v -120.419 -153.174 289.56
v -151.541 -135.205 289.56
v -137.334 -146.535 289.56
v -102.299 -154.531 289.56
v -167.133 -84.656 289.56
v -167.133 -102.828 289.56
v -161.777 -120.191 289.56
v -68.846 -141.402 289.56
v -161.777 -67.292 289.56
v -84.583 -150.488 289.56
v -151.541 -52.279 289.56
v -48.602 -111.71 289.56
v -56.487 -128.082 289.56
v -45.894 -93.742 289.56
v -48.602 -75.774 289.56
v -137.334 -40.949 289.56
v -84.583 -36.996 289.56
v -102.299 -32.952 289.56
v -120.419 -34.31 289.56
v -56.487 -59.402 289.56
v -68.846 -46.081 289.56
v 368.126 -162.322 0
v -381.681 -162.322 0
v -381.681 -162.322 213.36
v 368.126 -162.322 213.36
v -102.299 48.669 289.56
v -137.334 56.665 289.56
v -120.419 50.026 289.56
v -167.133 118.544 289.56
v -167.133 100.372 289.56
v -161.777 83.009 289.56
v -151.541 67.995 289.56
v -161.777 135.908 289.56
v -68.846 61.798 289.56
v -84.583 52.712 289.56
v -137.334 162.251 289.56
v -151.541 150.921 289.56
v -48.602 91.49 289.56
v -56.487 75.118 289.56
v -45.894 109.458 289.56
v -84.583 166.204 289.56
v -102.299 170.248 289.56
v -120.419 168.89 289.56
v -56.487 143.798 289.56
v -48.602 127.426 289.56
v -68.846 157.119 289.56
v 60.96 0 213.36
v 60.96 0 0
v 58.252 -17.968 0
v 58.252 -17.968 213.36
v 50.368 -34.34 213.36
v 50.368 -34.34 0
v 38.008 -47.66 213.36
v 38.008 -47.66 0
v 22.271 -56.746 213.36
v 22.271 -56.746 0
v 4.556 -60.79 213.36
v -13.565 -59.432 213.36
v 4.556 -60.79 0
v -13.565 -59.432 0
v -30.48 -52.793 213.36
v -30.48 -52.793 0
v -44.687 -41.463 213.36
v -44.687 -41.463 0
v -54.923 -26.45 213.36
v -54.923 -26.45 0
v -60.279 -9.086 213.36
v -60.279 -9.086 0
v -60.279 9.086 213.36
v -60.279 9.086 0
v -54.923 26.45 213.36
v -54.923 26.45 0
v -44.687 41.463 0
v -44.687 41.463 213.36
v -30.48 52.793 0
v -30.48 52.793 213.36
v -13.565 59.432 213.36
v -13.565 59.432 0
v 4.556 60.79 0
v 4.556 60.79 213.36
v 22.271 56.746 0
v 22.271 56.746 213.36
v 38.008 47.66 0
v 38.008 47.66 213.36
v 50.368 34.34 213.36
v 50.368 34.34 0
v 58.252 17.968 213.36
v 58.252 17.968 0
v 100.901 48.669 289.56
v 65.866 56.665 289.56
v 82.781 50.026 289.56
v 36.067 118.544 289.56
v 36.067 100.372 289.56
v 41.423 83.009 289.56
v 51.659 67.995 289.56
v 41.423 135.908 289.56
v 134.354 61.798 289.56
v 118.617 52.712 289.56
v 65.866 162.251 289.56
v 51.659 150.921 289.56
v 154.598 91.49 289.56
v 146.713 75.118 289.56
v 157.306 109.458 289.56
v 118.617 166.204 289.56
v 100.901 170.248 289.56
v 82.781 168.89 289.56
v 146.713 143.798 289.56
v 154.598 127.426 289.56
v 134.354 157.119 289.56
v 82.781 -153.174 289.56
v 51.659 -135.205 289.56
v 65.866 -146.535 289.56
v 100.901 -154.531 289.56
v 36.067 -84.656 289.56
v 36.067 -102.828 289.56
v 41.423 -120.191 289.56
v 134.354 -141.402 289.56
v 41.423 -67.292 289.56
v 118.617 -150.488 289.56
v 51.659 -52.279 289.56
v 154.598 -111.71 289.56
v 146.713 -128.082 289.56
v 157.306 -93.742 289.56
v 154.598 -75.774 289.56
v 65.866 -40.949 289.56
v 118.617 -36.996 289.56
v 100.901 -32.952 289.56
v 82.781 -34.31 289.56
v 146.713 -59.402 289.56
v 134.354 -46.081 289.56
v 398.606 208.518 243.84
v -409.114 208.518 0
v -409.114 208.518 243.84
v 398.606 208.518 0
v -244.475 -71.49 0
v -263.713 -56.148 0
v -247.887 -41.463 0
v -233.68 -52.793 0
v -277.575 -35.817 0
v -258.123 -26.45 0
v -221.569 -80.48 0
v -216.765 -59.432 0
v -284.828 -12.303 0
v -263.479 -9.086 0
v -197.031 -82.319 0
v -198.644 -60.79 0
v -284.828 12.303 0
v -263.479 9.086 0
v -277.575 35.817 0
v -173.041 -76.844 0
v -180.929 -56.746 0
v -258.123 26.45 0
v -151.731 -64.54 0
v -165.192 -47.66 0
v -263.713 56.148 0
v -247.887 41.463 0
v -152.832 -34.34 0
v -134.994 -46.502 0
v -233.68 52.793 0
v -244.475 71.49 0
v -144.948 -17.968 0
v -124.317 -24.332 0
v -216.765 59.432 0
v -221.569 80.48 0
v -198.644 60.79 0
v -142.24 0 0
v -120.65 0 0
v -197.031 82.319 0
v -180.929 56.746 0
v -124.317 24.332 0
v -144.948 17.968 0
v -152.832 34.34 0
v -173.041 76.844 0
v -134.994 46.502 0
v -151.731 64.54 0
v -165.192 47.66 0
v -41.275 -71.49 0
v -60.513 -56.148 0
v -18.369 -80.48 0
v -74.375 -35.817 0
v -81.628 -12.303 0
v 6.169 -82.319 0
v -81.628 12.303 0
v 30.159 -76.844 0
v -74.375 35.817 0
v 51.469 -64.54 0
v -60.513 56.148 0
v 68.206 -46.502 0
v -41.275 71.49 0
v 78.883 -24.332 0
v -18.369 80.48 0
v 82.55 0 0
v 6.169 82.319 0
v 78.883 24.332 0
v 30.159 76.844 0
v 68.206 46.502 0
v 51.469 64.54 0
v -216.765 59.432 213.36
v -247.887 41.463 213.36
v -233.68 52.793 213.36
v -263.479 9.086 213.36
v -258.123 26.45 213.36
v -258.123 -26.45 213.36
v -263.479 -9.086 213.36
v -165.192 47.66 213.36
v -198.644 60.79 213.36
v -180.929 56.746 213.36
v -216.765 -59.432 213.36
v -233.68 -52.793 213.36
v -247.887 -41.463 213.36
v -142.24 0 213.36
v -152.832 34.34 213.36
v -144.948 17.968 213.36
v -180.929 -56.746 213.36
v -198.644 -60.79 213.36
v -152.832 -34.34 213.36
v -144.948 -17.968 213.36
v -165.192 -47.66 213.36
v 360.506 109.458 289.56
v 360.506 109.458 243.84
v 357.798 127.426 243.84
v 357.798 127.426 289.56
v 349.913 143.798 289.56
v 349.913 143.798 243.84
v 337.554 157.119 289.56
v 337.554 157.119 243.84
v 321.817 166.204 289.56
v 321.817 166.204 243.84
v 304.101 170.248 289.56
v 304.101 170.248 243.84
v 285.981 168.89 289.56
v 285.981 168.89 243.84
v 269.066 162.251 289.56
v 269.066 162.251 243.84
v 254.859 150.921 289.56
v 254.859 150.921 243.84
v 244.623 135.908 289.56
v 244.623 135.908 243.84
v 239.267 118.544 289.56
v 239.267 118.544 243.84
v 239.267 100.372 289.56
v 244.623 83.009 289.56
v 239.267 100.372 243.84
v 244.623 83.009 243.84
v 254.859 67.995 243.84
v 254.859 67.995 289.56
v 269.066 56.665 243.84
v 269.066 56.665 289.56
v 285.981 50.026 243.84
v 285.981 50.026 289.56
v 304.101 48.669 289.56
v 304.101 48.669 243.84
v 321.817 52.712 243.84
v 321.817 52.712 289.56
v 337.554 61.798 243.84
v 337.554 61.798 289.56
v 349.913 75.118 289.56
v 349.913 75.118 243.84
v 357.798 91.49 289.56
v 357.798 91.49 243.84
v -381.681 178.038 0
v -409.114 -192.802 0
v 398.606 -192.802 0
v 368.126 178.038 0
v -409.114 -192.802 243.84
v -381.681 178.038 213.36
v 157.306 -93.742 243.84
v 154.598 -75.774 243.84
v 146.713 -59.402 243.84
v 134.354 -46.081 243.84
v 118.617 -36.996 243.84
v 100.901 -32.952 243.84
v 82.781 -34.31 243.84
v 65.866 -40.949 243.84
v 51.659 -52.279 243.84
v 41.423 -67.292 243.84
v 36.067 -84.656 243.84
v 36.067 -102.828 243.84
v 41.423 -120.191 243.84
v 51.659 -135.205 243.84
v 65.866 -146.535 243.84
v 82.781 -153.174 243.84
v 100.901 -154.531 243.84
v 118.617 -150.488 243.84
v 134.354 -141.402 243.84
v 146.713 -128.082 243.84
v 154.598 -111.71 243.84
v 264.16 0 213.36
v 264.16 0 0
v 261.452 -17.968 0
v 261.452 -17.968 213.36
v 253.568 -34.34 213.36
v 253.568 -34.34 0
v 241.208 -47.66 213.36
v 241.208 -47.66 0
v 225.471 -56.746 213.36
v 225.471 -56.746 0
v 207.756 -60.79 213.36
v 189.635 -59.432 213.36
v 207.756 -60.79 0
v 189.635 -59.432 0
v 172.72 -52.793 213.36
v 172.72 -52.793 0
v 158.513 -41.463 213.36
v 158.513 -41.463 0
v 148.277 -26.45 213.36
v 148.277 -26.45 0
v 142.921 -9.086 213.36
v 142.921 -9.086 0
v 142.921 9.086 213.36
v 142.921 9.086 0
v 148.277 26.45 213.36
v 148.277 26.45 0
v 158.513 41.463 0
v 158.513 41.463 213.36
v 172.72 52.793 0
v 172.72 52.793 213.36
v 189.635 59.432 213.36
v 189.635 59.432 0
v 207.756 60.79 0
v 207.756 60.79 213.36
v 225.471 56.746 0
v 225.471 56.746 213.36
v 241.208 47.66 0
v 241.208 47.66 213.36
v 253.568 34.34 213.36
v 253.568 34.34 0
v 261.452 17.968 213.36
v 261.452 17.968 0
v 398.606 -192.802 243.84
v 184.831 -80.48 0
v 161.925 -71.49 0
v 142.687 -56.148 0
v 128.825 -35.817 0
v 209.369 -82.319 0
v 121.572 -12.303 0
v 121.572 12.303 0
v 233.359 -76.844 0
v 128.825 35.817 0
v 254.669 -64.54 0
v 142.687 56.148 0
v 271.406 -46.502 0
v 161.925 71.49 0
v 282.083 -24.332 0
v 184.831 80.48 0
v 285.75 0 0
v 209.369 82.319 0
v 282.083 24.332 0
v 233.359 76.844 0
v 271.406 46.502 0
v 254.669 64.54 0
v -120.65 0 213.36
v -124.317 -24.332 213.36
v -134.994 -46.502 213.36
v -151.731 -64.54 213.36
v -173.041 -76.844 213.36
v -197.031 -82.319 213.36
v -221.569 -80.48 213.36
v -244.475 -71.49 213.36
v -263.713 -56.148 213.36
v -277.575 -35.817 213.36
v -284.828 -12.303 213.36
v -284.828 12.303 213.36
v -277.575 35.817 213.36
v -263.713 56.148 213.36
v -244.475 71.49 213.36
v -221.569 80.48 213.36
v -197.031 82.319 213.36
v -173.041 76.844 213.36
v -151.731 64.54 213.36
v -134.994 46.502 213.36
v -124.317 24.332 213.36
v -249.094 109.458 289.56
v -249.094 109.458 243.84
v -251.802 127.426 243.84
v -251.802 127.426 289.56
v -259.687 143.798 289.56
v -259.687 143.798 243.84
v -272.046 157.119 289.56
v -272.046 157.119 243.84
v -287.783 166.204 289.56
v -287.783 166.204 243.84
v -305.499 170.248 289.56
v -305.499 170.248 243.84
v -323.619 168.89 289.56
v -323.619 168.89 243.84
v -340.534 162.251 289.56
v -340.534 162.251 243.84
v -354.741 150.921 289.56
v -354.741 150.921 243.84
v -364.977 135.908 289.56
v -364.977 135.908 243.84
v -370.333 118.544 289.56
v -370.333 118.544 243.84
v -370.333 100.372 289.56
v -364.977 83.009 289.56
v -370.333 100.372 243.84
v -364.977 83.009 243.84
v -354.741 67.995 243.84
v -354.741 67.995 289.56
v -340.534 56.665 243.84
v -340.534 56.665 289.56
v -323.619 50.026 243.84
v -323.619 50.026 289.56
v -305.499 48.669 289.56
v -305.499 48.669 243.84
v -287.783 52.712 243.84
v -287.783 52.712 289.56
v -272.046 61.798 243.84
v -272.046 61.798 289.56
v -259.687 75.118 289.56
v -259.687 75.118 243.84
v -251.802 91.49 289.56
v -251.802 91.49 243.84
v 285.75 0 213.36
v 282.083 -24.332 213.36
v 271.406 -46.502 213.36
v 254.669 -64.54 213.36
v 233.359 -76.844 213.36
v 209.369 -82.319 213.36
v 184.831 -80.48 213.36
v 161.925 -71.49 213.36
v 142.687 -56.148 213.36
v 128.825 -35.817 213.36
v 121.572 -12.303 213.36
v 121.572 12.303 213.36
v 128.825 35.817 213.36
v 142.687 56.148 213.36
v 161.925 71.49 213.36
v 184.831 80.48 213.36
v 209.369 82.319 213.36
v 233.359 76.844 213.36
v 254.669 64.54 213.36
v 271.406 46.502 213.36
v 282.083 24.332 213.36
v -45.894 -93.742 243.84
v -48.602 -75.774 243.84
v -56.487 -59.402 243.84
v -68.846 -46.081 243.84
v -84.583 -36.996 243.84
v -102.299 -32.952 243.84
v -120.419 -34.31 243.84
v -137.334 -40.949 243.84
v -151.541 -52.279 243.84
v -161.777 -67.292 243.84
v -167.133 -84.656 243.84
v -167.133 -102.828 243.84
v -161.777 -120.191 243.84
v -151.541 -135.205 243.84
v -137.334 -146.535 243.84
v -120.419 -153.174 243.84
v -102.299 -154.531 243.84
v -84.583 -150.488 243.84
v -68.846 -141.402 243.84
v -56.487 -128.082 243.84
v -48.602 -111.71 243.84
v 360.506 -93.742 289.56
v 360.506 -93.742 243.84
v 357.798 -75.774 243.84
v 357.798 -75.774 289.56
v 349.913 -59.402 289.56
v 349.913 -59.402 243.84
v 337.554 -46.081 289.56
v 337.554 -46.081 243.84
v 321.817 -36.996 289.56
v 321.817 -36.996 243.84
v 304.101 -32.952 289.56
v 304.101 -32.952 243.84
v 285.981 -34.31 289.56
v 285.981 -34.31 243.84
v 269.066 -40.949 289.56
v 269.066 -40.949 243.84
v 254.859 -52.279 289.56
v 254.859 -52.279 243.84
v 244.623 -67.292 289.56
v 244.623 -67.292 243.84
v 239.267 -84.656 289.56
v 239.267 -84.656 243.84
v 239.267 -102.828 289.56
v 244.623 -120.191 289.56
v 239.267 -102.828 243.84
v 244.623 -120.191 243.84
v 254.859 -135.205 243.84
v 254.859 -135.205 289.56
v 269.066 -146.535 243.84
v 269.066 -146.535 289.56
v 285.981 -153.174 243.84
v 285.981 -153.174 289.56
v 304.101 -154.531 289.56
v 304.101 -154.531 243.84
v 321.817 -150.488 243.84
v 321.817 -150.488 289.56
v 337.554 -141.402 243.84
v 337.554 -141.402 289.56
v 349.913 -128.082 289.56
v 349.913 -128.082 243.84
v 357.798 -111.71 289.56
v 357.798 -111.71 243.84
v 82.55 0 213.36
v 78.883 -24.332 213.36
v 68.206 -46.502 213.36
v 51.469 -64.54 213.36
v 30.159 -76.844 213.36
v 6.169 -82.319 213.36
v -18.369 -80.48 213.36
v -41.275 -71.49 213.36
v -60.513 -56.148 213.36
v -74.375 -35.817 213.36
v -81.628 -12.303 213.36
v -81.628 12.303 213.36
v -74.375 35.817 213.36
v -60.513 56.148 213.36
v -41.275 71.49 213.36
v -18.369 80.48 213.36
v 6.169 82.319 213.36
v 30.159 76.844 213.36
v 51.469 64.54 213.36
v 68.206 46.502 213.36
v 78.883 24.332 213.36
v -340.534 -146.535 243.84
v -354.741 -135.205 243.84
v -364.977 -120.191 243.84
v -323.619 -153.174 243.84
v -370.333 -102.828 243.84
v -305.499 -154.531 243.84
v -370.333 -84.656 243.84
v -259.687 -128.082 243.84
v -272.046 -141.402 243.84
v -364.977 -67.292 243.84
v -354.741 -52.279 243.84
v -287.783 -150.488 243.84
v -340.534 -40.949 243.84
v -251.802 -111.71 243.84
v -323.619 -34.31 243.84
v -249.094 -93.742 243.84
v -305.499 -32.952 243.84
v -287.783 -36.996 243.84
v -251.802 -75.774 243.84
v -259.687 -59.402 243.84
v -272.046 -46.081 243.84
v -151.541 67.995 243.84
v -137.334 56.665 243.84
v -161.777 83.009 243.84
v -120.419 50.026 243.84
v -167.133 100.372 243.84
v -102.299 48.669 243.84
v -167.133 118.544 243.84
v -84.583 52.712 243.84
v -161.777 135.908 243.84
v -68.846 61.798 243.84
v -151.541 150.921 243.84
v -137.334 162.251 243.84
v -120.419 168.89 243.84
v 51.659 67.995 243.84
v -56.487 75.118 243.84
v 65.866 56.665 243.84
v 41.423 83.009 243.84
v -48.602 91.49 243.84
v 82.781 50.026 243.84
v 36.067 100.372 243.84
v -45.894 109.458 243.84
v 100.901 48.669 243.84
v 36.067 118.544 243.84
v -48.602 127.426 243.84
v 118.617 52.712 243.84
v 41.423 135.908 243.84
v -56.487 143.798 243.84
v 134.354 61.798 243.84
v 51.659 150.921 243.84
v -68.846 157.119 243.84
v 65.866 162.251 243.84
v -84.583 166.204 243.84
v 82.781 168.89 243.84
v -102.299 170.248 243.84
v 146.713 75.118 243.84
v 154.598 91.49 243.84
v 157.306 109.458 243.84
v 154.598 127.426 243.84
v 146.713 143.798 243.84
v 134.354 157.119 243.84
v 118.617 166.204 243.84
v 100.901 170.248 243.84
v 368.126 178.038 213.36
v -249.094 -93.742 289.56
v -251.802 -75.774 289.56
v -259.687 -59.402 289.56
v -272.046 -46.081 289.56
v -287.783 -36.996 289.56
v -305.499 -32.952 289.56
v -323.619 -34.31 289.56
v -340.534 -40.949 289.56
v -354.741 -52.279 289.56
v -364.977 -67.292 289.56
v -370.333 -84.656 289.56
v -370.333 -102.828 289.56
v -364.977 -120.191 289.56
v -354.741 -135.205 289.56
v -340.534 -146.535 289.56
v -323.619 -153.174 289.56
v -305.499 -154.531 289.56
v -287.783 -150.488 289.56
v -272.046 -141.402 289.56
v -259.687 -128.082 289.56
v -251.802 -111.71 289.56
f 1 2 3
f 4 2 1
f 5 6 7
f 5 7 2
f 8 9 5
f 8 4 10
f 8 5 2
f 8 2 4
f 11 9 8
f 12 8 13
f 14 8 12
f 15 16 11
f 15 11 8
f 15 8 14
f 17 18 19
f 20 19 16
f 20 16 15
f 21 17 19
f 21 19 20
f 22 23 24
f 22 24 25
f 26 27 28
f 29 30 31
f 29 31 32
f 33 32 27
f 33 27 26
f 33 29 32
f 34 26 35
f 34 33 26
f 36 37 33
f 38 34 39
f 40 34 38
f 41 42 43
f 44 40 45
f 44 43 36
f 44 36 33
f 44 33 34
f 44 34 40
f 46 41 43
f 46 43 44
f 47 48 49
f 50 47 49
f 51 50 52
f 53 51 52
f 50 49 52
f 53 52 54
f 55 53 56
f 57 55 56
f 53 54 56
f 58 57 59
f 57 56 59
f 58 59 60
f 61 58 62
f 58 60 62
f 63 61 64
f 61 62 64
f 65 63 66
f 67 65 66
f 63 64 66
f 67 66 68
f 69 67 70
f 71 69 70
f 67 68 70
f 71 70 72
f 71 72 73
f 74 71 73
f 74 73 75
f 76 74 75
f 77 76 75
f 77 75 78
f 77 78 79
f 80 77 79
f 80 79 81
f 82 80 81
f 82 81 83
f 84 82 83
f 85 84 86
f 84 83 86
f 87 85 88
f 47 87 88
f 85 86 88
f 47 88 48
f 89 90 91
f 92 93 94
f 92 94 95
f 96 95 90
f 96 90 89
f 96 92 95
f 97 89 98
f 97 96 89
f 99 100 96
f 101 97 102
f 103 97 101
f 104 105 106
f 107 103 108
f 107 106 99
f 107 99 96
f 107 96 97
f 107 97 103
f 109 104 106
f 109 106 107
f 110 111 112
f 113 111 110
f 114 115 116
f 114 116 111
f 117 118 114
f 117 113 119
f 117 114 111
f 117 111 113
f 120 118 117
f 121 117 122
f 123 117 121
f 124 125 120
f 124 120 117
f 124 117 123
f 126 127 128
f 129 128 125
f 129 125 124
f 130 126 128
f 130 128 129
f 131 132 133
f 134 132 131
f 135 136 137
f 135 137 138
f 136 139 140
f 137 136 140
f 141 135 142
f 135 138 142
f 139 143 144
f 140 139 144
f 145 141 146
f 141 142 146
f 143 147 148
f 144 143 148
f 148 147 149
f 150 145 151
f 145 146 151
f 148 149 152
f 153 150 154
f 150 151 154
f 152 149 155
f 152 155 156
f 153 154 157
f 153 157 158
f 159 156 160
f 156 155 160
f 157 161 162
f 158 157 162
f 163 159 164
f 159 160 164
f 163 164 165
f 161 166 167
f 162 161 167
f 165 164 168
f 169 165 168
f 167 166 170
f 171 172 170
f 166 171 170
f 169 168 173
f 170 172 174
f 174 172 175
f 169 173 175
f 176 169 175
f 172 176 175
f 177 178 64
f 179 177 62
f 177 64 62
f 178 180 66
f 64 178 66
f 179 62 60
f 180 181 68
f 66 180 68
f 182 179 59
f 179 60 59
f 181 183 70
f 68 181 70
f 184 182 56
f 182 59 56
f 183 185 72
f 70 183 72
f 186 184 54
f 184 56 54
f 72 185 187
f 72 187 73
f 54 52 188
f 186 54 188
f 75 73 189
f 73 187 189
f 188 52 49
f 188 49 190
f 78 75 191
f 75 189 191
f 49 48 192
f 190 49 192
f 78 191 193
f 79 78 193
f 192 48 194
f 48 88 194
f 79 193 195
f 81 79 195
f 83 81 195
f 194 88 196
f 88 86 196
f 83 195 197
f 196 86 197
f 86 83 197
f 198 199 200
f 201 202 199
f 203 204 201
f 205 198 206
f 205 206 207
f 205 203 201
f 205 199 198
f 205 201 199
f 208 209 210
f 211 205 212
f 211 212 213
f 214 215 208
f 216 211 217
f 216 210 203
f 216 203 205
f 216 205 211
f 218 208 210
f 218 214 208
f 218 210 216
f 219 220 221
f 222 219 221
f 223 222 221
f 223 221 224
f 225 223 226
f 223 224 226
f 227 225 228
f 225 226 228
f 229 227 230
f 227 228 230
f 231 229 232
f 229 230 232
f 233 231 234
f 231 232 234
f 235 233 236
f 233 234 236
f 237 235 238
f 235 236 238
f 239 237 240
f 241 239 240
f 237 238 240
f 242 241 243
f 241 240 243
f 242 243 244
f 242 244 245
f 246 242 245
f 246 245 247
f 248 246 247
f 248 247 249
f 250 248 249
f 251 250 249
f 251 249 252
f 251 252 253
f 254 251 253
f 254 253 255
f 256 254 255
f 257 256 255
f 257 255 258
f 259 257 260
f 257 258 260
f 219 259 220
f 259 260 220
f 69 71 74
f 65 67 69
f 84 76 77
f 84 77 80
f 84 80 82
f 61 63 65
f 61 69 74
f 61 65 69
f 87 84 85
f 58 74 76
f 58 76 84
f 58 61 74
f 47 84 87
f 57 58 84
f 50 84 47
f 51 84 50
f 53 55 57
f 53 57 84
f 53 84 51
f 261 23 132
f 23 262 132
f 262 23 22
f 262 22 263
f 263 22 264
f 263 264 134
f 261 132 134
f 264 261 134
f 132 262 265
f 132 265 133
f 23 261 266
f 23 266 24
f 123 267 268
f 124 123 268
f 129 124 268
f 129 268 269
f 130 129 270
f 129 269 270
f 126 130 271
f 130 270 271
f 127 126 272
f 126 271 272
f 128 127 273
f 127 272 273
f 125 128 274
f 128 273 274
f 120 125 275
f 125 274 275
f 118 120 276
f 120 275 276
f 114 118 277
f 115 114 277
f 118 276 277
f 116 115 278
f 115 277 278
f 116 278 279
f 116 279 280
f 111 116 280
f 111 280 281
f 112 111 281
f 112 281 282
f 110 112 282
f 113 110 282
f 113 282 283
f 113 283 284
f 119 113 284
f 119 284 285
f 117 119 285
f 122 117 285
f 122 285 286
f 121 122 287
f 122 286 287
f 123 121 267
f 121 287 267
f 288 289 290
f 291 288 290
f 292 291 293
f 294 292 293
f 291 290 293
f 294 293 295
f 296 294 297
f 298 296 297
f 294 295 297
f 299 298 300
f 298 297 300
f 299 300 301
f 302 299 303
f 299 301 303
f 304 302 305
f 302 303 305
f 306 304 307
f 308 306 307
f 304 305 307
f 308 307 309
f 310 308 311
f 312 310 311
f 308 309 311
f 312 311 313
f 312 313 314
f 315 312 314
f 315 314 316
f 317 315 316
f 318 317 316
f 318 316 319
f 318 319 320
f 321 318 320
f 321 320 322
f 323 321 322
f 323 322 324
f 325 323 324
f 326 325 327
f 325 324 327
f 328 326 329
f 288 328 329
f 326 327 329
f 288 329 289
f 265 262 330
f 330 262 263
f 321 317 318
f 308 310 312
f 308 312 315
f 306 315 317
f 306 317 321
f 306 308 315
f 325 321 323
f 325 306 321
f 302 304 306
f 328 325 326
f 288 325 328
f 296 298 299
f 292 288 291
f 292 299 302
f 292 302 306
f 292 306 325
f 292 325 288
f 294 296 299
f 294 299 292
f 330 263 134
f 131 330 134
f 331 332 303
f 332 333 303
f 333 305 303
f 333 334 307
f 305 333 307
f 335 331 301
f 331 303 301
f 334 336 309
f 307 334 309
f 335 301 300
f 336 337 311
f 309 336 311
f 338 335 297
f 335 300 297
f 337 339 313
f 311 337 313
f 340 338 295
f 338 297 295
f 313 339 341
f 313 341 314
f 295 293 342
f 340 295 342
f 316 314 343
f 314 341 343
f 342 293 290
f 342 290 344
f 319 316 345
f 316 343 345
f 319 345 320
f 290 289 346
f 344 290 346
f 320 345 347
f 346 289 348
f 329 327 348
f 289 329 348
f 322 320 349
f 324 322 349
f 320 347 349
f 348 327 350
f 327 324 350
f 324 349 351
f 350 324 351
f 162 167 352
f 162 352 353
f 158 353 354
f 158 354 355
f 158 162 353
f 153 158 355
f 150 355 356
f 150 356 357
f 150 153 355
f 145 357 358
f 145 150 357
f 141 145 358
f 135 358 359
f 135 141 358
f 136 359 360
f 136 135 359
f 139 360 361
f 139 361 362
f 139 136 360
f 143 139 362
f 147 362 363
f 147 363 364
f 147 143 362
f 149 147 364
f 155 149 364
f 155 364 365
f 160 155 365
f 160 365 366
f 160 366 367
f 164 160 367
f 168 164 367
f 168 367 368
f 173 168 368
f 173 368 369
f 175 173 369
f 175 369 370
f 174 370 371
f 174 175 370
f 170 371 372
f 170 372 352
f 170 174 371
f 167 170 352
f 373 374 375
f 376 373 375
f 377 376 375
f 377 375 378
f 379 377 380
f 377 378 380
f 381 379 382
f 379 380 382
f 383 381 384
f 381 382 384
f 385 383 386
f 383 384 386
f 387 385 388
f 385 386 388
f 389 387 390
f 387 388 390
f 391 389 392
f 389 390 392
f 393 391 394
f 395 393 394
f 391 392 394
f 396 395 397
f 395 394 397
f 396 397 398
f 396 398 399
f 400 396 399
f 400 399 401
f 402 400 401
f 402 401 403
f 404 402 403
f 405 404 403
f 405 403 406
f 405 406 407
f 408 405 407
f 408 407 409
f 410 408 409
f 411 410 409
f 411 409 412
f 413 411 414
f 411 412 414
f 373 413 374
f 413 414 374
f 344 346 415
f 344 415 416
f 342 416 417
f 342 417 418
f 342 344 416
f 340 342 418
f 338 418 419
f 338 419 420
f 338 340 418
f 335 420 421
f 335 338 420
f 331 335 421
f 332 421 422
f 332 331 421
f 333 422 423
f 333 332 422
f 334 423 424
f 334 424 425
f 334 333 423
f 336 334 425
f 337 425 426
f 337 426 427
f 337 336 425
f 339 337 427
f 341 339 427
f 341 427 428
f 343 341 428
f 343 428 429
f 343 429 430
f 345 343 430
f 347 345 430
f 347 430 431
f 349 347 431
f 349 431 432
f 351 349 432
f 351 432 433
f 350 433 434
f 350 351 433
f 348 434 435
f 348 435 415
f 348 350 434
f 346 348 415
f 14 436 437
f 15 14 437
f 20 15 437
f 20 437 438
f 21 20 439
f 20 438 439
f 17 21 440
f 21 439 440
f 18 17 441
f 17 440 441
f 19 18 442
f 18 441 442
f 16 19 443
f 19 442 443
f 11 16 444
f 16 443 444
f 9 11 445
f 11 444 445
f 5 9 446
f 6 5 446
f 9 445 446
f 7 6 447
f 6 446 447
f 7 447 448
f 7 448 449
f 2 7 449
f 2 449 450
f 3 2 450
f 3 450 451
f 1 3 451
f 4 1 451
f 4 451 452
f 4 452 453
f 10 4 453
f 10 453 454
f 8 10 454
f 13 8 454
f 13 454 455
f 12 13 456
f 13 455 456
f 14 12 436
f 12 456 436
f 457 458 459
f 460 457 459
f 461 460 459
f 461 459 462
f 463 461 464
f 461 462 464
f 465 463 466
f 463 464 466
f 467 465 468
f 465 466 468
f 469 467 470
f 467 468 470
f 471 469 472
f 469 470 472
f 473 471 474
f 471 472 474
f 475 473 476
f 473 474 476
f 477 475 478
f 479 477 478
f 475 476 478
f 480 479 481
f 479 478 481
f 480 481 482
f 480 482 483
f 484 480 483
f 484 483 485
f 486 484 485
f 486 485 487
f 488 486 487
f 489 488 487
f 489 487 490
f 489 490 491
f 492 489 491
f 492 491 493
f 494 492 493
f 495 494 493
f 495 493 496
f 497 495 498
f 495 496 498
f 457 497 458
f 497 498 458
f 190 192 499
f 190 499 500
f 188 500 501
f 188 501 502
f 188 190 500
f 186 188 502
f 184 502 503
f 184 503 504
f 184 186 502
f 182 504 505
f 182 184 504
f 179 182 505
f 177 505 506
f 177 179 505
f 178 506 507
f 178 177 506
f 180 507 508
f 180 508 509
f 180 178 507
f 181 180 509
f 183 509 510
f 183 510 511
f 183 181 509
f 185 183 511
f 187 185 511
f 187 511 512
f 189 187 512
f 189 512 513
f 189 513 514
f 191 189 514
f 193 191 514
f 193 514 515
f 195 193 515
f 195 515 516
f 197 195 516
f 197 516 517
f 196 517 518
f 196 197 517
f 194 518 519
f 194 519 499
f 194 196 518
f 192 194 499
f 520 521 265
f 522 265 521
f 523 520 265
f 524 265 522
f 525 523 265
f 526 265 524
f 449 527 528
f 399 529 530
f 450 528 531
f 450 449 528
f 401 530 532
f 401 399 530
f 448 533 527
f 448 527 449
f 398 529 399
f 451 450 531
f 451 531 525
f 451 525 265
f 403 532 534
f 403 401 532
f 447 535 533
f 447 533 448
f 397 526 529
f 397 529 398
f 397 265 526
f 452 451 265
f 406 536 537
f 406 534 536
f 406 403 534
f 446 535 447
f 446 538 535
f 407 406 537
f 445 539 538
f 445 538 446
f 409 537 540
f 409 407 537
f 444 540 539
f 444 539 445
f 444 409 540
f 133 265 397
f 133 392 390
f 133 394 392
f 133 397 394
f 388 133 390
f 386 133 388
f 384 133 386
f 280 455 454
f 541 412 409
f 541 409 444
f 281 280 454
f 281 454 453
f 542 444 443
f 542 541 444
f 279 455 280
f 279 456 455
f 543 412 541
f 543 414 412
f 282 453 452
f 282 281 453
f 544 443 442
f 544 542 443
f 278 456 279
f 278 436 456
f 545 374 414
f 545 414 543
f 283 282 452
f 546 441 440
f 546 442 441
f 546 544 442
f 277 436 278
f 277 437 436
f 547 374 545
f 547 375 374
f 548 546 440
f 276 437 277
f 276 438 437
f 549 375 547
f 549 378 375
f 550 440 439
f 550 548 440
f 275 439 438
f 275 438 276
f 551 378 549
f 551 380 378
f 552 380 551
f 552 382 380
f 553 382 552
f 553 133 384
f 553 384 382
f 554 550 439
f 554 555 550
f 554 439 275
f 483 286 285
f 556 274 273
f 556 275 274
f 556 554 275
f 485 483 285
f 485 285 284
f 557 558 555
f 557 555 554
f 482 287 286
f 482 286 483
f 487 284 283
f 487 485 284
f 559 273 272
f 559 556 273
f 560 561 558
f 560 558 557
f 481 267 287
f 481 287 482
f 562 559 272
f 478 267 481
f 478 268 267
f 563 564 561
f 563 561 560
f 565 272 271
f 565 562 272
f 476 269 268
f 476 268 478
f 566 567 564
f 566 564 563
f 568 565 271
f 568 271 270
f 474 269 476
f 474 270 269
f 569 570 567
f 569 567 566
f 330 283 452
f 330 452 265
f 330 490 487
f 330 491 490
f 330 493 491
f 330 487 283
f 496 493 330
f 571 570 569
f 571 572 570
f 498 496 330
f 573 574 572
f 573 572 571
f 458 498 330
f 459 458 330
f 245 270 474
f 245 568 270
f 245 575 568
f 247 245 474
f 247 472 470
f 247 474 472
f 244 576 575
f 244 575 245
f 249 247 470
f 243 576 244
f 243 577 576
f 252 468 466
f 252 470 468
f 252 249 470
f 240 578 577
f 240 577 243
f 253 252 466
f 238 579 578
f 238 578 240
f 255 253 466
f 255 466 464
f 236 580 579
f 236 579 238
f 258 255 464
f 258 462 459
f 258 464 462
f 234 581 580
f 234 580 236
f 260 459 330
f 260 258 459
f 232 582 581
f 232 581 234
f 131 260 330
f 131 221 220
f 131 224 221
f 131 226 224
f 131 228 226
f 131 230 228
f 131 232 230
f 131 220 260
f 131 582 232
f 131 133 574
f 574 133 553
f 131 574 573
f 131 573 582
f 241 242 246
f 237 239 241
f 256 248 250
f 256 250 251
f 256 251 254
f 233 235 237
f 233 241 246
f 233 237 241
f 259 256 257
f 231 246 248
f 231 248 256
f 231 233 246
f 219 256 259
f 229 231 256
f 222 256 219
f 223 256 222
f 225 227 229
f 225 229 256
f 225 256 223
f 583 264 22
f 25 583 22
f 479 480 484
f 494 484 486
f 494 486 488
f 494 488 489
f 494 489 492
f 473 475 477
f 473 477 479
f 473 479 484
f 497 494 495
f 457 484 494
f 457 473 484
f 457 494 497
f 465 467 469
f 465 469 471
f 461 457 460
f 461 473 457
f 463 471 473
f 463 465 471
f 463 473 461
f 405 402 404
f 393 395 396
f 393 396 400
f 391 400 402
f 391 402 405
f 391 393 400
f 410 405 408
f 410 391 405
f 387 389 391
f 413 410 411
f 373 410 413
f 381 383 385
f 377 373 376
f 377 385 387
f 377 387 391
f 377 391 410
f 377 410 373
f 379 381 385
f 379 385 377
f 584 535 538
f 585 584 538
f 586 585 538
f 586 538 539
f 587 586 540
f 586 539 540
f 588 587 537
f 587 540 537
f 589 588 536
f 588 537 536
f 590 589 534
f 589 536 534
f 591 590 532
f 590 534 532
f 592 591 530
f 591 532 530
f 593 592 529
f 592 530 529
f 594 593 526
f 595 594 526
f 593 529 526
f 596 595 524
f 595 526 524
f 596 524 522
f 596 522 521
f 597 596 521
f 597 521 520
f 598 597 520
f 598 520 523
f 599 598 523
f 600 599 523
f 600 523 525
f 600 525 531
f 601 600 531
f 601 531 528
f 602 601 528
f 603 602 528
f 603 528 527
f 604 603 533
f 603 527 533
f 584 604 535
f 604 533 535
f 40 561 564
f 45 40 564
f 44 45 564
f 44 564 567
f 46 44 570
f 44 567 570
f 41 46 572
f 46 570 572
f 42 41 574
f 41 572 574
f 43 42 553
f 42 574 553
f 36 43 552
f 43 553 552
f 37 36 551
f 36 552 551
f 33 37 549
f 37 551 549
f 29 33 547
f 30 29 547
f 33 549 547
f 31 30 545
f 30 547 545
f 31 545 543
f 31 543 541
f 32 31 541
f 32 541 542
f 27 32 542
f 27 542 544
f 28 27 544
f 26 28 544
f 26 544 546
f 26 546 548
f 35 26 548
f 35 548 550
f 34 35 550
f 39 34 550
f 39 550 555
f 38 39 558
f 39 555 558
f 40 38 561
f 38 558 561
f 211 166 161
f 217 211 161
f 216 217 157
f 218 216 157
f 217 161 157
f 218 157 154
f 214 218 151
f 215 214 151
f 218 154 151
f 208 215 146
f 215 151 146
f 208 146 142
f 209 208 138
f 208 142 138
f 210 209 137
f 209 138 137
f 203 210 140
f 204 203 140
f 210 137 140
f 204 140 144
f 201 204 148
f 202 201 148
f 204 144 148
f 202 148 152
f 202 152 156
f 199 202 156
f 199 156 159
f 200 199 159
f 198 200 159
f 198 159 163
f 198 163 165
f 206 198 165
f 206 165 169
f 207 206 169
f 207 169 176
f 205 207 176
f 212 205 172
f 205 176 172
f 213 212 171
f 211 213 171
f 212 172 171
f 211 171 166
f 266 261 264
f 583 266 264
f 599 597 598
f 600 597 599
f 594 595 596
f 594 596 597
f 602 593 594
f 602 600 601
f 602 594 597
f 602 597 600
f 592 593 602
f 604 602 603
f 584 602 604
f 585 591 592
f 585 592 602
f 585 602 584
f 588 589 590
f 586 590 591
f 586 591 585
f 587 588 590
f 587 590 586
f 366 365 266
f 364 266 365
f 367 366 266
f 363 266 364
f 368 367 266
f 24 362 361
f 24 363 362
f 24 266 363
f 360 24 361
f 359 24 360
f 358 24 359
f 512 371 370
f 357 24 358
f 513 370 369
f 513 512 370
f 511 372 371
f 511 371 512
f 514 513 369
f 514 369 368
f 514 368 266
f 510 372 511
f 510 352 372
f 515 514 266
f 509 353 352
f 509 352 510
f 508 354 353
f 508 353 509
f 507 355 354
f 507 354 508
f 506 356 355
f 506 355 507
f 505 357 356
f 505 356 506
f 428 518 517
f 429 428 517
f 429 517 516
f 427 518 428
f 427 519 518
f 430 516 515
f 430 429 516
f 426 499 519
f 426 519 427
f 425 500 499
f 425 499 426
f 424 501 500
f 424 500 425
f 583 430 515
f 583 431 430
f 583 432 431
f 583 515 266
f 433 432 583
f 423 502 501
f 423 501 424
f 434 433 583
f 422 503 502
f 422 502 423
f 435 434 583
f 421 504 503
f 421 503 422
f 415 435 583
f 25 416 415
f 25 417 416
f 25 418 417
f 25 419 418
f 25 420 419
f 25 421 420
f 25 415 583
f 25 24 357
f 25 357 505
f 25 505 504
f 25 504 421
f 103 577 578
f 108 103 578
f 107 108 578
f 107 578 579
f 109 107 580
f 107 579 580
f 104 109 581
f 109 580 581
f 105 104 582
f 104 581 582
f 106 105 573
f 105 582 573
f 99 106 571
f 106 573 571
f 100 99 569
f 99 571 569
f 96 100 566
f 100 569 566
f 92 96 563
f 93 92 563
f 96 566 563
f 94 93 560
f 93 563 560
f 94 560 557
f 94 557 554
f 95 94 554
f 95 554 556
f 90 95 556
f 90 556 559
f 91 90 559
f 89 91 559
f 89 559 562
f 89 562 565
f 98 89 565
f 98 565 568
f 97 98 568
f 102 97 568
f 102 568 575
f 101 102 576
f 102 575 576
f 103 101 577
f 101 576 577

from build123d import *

# Parameters (mm, degrees)
F0_W     = 807.72
F0_H     = 401.32
F1_DEPTH = 243.84
F2_R     = 60.96
F3_DEPTH = 45.72
F4_W     = 749.806969
F4_H     = 340.36
F4_R     = 82.55
F4_R_2   = 60.96
F5_DEPTH = 213.36


with BuildPart() as f1:
    # F0 (on Top) → F1 (new body)
    with BuildSketch(Plane.XY):
        with Locations((-5.254116, 7.858066)):
            Rectangle(F0_W, F0_H)
    extrude(amount=F1_DEPTH)

    # F2 (on face) → F3 (join)
    with BuildSketch(Plane.XY.offset(243.84)):
        with Locations((-310.054116, 109.458066)):
            Circle(F2_R)
        with Locations((-310.054116, -93.741934)):
            Circle(F2_R)
        with Locations((-106.854116, 109.458066)):
            Circle(F2_R)
        with Locations((-106.854116, -93.741934)):
            Circle(F2_R)
        with Locations((96.345884, 109.458066)):
            Circle(F2_R)
        with Locations((96.345884, -93.741934)):
            Circle(F2_R)
        with Locations((299.545884, 109.458066)):
            Circle(F2_R)
        with Locations((299.545884, -93.741934)):
            Circle(F2_R)
    extrude(amount=F3_DEPTH)

    # F4 (on face) → F5 (cut)
    with BuildSketch(Plane(origin=(0, 0, 0), x_dir=(1, 0, 0), z_dir=(0, 0, -1))):
        with Locations((-6.777601, -7.858066)):
            Rectangle(F4_W, F4_H)
        with Locations((-203.2, 0)):
            Circle(F4_R, mode=Mode.SUBTRACT)
        Circle(F4_R, mode=Mode.SUBTRACT)
        with Locations((203.2, 0)):
            Circle(F4_R, mode=Mode.SUBTRACT)
        with Locations((-203.2, 0)):
            Circle(F4_R_2)
        Circle(F4_R_2)
        with Locations((203.2, 0)):
            Circle(F4_R_2)
    extrude(amount=-F5_DEPTH, mode=Mode.SUBTRACT)


solid = f1.part
